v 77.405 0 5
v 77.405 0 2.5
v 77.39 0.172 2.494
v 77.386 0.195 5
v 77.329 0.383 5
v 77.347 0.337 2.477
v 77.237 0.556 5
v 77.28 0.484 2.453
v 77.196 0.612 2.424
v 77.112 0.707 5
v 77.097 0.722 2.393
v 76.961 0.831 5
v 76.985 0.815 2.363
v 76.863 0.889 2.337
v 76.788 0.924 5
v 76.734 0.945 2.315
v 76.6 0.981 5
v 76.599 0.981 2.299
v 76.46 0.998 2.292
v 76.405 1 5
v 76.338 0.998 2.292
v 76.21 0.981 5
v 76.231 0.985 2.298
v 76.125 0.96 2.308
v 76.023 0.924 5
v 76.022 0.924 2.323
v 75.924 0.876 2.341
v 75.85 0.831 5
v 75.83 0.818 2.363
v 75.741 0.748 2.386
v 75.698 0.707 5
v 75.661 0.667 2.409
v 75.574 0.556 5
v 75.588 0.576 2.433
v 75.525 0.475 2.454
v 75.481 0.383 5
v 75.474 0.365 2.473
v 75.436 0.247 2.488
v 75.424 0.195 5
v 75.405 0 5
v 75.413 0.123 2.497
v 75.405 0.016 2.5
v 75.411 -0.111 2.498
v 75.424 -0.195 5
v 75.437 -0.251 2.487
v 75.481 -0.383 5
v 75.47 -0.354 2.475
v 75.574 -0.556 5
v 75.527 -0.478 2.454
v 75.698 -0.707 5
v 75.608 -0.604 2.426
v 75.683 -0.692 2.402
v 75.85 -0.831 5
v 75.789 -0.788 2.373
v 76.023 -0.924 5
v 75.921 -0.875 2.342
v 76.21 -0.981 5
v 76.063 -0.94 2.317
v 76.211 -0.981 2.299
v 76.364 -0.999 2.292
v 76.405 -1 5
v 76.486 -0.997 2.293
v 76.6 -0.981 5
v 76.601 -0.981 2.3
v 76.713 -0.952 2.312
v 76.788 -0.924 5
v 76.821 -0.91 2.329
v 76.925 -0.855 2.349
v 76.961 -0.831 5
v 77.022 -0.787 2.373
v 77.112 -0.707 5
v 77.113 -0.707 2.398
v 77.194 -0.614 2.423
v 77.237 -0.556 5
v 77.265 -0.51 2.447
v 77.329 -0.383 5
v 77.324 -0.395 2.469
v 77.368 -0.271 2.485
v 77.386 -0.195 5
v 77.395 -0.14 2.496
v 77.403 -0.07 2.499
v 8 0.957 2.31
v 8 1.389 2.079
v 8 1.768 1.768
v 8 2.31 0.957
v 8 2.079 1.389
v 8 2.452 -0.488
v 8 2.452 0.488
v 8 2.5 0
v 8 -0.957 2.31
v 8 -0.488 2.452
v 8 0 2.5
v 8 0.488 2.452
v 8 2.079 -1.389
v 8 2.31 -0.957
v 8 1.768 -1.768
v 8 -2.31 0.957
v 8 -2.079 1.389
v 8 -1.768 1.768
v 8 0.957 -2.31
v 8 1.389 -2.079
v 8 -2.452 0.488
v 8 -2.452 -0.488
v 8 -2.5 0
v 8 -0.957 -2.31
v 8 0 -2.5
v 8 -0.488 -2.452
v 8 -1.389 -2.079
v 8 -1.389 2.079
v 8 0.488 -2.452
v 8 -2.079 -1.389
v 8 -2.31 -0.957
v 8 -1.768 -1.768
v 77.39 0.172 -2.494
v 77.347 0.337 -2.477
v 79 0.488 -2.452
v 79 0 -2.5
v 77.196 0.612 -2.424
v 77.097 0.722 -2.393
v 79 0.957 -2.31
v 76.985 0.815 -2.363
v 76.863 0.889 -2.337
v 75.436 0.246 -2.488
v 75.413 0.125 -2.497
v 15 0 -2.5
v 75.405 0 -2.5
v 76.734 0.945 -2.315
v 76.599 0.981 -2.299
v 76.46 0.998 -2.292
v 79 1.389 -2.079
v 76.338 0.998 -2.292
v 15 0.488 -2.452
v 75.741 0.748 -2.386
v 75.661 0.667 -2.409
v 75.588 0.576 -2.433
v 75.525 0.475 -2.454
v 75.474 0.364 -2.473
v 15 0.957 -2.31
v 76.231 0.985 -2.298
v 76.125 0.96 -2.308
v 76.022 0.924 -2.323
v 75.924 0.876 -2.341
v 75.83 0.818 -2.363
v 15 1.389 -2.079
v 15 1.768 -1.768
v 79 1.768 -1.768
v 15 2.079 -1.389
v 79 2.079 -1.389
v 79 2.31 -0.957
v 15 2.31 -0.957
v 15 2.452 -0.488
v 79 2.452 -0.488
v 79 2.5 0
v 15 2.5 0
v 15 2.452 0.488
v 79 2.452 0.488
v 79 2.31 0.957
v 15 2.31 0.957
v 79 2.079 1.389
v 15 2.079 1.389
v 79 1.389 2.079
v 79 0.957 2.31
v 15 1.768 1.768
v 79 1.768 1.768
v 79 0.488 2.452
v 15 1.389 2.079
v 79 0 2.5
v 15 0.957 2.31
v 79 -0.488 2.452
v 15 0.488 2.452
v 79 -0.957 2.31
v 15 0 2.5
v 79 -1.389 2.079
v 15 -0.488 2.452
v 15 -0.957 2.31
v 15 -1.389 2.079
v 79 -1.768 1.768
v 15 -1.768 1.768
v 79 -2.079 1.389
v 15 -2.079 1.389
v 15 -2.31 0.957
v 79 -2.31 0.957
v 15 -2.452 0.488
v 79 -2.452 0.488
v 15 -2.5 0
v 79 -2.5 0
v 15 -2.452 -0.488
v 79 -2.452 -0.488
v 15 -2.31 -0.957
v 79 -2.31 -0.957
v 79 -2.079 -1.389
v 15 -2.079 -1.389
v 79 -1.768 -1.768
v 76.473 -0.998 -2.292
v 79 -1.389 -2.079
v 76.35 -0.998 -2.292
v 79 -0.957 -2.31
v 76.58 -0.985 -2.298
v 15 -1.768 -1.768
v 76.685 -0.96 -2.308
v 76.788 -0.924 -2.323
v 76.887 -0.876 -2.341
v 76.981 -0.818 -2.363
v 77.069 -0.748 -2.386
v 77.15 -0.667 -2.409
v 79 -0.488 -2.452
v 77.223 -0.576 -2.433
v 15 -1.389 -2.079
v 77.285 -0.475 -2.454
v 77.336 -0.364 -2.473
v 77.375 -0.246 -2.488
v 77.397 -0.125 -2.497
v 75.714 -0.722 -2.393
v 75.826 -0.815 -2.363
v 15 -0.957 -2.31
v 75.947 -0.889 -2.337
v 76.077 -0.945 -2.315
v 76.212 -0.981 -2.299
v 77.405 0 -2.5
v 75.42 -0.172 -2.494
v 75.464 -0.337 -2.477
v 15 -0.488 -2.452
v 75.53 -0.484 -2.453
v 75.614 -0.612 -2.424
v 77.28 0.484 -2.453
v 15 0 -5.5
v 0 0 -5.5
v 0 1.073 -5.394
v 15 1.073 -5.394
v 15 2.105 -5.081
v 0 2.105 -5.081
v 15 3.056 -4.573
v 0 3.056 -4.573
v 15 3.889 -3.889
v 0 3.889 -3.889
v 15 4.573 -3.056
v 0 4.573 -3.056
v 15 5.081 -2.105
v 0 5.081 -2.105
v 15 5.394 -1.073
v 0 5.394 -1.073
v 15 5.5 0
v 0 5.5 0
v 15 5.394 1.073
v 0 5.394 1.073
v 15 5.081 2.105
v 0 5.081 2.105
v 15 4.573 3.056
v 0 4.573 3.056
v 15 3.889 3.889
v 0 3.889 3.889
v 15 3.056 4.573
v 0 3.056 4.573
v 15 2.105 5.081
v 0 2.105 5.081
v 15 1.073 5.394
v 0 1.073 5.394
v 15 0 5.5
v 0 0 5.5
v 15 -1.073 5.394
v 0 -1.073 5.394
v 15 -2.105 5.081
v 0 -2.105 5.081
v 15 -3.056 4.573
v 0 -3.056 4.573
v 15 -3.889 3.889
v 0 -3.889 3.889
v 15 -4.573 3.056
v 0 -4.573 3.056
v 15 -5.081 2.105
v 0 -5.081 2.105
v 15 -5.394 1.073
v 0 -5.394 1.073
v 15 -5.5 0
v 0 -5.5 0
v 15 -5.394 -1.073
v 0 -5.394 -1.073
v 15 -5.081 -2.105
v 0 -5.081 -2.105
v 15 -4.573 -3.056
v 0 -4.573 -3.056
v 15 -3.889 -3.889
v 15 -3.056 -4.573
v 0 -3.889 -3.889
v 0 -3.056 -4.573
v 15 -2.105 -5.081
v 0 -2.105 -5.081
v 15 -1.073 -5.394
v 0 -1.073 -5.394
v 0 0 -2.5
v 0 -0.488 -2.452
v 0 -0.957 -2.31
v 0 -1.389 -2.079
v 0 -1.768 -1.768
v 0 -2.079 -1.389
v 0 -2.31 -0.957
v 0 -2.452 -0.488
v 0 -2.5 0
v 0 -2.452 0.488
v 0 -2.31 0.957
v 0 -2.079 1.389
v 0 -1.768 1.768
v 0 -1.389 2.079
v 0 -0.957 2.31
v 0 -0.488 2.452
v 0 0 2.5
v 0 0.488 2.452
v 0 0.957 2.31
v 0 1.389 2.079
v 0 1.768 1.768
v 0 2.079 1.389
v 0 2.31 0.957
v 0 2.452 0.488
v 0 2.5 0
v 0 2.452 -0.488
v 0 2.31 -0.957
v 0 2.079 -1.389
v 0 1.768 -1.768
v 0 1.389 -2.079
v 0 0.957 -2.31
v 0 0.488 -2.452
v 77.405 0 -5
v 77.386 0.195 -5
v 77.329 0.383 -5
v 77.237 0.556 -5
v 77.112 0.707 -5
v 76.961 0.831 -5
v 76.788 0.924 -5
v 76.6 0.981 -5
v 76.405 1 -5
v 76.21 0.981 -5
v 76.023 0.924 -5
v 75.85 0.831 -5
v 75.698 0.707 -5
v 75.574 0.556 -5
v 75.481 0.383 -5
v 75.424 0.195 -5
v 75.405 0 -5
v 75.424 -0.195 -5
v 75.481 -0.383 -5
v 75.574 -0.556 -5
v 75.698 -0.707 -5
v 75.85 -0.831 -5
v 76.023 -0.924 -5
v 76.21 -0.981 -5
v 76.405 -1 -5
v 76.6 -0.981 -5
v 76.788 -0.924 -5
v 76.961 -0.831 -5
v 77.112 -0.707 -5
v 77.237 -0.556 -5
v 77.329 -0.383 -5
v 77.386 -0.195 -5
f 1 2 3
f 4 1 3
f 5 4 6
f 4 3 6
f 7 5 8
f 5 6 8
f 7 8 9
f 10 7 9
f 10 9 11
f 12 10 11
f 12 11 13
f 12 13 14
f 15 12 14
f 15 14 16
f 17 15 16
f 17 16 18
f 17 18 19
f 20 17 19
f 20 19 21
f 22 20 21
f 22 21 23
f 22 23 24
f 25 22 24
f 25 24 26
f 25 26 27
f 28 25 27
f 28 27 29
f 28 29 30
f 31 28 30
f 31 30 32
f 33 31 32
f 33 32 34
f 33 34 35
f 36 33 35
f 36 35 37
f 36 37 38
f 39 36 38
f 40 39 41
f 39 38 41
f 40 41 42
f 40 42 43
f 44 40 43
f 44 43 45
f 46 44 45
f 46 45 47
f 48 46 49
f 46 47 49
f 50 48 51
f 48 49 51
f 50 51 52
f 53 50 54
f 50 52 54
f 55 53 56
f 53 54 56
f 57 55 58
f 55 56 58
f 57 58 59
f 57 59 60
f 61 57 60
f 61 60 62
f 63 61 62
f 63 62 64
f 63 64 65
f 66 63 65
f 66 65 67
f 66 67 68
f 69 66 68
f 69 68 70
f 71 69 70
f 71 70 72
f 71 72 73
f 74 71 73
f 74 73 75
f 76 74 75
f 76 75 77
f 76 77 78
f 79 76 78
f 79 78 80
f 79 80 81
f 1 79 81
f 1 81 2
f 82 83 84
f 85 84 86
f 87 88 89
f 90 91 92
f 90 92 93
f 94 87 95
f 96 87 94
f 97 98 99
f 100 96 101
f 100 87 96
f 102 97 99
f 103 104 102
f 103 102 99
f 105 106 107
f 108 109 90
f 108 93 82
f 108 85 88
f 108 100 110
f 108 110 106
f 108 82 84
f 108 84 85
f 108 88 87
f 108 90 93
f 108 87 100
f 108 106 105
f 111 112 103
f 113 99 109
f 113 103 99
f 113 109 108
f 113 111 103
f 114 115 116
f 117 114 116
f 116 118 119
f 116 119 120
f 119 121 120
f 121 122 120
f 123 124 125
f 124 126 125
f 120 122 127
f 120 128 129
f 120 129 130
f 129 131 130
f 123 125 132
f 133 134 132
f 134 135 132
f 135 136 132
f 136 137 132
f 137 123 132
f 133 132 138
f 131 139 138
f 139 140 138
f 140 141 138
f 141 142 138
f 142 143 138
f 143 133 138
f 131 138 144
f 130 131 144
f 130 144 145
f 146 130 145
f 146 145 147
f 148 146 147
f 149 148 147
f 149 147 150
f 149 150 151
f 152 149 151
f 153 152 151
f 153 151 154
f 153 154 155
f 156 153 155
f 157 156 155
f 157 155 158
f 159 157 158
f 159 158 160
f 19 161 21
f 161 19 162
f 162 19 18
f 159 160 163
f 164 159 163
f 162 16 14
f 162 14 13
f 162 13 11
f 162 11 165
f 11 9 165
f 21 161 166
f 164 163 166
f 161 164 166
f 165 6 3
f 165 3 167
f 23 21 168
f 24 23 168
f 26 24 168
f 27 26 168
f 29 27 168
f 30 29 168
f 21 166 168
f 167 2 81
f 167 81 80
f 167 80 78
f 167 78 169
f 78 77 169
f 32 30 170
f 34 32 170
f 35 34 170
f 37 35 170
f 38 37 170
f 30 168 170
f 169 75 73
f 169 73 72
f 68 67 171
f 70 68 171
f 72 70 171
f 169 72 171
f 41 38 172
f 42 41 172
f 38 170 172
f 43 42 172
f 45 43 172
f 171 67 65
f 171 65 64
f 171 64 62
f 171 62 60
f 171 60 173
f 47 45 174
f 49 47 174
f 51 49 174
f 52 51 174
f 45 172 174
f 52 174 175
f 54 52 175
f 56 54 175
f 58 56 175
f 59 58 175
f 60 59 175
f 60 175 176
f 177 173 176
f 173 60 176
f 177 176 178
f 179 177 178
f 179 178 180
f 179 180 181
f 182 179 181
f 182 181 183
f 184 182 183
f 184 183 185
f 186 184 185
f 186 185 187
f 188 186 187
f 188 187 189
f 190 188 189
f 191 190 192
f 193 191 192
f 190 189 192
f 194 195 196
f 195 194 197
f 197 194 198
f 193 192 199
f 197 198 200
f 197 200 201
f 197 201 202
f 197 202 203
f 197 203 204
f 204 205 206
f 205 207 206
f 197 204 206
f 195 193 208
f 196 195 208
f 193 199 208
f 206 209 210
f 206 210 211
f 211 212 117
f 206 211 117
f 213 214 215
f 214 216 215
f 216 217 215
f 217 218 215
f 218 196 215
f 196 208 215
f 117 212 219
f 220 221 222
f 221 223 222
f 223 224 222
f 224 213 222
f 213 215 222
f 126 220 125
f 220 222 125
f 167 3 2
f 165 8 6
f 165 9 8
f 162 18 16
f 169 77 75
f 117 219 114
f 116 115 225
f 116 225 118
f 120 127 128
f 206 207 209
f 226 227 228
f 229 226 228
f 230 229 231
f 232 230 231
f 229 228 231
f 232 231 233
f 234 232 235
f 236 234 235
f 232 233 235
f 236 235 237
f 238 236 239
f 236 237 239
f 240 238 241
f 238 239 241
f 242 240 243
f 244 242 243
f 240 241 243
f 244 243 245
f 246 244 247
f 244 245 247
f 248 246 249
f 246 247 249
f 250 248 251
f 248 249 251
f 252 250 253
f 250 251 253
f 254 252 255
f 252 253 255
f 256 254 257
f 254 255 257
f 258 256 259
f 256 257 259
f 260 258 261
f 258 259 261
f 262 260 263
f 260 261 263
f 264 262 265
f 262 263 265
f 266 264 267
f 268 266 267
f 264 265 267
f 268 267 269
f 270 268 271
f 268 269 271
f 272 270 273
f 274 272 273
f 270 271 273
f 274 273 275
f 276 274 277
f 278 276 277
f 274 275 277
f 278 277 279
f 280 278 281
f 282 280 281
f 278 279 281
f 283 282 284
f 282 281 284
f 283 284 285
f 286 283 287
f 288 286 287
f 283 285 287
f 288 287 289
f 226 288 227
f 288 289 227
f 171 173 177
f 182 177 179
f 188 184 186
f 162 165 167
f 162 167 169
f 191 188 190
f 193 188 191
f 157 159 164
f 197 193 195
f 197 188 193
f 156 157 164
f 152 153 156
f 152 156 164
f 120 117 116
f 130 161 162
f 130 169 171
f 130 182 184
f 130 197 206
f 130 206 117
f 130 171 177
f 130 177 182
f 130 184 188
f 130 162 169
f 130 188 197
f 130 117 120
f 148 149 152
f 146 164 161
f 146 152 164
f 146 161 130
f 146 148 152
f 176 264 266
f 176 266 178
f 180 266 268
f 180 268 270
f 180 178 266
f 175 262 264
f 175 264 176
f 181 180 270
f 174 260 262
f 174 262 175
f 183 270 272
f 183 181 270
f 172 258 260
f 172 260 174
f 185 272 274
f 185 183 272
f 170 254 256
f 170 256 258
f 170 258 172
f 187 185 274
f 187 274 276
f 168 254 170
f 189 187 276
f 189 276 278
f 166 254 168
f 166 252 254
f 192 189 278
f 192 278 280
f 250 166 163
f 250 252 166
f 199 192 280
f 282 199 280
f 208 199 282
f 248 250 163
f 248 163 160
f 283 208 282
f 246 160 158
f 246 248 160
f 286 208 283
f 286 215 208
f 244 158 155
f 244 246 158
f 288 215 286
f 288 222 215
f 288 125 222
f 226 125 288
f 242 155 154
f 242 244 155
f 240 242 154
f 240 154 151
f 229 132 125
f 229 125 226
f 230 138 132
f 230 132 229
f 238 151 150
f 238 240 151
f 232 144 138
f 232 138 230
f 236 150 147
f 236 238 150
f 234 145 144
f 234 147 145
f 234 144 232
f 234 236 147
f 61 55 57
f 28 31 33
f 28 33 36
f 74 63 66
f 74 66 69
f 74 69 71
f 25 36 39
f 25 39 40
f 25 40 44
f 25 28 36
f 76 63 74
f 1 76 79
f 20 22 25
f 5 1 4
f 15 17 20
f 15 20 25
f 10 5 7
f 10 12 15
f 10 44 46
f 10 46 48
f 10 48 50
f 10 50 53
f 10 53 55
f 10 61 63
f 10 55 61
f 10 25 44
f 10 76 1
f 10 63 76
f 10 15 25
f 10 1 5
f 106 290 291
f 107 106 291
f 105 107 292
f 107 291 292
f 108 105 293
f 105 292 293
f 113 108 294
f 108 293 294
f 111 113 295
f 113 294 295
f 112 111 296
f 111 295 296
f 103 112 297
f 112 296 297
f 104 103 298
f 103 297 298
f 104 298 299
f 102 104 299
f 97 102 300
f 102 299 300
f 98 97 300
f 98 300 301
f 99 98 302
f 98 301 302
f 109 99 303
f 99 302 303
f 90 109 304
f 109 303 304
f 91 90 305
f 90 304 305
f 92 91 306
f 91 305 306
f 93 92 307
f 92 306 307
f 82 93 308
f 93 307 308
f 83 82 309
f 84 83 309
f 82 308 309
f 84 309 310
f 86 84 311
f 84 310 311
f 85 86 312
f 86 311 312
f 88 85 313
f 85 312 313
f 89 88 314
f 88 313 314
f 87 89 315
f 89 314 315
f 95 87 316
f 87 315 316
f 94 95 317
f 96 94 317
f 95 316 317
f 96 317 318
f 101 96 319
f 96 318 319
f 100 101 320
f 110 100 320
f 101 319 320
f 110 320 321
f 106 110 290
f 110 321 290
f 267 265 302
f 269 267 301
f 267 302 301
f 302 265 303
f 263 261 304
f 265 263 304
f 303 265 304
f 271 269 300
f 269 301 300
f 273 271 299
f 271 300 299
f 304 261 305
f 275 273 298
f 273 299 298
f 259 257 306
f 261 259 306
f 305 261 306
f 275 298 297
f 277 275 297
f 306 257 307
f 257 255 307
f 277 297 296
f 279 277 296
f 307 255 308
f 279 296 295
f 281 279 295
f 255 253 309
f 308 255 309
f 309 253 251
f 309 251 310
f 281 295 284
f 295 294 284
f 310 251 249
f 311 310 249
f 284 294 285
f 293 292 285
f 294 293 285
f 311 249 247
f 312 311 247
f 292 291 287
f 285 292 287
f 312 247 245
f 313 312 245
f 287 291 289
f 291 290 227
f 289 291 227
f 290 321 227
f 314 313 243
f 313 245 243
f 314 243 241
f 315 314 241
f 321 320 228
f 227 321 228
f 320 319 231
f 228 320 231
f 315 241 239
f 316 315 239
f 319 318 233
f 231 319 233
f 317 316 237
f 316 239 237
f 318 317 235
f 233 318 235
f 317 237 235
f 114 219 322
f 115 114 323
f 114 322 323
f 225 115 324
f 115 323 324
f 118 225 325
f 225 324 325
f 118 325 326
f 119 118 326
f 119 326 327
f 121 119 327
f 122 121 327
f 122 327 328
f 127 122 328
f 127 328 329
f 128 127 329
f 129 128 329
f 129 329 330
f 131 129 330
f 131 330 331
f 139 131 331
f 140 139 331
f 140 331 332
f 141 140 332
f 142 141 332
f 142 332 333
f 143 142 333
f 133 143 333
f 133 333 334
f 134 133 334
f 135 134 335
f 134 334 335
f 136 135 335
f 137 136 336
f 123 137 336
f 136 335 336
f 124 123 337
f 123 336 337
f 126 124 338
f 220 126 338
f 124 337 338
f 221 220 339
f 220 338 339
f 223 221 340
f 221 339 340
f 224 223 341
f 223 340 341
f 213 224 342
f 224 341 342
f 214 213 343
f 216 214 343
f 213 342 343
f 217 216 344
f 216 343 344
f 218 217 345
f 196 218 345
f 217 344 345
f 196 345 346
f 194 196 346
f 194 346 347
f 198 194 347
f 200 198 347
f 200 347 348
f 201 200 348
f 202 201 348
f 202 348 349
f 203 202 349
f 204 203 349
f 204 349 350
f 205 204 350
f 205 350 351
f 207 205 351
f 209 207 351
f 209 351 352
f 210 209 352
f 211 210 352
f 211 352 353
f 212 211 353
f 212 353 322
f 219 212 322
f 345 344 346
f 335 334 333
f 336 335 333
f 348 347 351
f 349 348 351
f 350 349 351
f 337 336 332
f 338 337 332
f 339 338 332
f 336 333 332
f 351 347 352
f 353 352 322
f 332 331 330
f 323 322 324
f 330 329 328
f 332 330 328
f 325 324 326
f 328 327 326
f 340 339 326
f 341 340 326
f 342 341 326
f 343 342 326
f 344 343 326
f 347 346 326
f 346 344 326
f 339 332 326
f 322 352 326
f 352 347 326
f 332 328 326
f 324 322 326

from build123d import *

# Parameters (mm, degrees)
SKETCH1_R                = 5.5
BOSS_EXTRUDE1_DEPTH      = 15
SKETCH2_R                = 2.5
BOSS_EXTRUDE2_DEPTH      = 64
SKETCH3_R                = 2.5
CUT_EXTRUDE1_DEPTH       = 8
BOSS_EXTRUDE3_DEPTH      = 2.5
BOSS_EXTRUDE3_DEPTH_BACK = 7.5
SKETCH4_R                = 1


with BuildPart() as part:
    # Sketch1 → Boss-Extrude1 (new body)
    with BuildSketch(Plane(origin=(0, 0, 0), x_dir=(0, 0, -1), z_dir=(1, 0, 0))):
        Circle(SKETCH1_R)
    extrude(amount=BOSS_EXTRUDE1_DEPTH)

    # Sketch2 → Boss-Extrude2 (add)
    with BuildSketch(Plane(origin=(15, 0, 0), x_dir=(0, 0, -1), z_dir=(1, 0, 0))):
        Circle(SKETCH2_R)
    extrude(amount=BOSS_EXTRUDE2_DEPTH)

    # Sketch3 → Cut-Extrude1 (cut)
    with BuildSketch(Plane.ZY):
        with Locations(Location((0, 0, 0), (0, 0, 180))):
            Circle(SKETCH3_R)
    extrude(amount=-CUT_EXTRUDE1_DEPTH, mode=Mode.SUBTRACT)

    # Sketch4 → Boss-Extrude3 (add, two sides: drawn at the far end of the back side and taken through both)
    with BuildSketch(Plane.XY.offset(2.5).offset(-BOSS_EXTRUDE3_DEPTH_BACK)):
        with Locations((76.405258654, 0)):
            Circle(SKETCH4_R)
    extrude(amount=BOSS_EXTRUDE3_DEPTH + BOSS_EXTRUDE3_DEPTH_BACK)


solid = part.part
